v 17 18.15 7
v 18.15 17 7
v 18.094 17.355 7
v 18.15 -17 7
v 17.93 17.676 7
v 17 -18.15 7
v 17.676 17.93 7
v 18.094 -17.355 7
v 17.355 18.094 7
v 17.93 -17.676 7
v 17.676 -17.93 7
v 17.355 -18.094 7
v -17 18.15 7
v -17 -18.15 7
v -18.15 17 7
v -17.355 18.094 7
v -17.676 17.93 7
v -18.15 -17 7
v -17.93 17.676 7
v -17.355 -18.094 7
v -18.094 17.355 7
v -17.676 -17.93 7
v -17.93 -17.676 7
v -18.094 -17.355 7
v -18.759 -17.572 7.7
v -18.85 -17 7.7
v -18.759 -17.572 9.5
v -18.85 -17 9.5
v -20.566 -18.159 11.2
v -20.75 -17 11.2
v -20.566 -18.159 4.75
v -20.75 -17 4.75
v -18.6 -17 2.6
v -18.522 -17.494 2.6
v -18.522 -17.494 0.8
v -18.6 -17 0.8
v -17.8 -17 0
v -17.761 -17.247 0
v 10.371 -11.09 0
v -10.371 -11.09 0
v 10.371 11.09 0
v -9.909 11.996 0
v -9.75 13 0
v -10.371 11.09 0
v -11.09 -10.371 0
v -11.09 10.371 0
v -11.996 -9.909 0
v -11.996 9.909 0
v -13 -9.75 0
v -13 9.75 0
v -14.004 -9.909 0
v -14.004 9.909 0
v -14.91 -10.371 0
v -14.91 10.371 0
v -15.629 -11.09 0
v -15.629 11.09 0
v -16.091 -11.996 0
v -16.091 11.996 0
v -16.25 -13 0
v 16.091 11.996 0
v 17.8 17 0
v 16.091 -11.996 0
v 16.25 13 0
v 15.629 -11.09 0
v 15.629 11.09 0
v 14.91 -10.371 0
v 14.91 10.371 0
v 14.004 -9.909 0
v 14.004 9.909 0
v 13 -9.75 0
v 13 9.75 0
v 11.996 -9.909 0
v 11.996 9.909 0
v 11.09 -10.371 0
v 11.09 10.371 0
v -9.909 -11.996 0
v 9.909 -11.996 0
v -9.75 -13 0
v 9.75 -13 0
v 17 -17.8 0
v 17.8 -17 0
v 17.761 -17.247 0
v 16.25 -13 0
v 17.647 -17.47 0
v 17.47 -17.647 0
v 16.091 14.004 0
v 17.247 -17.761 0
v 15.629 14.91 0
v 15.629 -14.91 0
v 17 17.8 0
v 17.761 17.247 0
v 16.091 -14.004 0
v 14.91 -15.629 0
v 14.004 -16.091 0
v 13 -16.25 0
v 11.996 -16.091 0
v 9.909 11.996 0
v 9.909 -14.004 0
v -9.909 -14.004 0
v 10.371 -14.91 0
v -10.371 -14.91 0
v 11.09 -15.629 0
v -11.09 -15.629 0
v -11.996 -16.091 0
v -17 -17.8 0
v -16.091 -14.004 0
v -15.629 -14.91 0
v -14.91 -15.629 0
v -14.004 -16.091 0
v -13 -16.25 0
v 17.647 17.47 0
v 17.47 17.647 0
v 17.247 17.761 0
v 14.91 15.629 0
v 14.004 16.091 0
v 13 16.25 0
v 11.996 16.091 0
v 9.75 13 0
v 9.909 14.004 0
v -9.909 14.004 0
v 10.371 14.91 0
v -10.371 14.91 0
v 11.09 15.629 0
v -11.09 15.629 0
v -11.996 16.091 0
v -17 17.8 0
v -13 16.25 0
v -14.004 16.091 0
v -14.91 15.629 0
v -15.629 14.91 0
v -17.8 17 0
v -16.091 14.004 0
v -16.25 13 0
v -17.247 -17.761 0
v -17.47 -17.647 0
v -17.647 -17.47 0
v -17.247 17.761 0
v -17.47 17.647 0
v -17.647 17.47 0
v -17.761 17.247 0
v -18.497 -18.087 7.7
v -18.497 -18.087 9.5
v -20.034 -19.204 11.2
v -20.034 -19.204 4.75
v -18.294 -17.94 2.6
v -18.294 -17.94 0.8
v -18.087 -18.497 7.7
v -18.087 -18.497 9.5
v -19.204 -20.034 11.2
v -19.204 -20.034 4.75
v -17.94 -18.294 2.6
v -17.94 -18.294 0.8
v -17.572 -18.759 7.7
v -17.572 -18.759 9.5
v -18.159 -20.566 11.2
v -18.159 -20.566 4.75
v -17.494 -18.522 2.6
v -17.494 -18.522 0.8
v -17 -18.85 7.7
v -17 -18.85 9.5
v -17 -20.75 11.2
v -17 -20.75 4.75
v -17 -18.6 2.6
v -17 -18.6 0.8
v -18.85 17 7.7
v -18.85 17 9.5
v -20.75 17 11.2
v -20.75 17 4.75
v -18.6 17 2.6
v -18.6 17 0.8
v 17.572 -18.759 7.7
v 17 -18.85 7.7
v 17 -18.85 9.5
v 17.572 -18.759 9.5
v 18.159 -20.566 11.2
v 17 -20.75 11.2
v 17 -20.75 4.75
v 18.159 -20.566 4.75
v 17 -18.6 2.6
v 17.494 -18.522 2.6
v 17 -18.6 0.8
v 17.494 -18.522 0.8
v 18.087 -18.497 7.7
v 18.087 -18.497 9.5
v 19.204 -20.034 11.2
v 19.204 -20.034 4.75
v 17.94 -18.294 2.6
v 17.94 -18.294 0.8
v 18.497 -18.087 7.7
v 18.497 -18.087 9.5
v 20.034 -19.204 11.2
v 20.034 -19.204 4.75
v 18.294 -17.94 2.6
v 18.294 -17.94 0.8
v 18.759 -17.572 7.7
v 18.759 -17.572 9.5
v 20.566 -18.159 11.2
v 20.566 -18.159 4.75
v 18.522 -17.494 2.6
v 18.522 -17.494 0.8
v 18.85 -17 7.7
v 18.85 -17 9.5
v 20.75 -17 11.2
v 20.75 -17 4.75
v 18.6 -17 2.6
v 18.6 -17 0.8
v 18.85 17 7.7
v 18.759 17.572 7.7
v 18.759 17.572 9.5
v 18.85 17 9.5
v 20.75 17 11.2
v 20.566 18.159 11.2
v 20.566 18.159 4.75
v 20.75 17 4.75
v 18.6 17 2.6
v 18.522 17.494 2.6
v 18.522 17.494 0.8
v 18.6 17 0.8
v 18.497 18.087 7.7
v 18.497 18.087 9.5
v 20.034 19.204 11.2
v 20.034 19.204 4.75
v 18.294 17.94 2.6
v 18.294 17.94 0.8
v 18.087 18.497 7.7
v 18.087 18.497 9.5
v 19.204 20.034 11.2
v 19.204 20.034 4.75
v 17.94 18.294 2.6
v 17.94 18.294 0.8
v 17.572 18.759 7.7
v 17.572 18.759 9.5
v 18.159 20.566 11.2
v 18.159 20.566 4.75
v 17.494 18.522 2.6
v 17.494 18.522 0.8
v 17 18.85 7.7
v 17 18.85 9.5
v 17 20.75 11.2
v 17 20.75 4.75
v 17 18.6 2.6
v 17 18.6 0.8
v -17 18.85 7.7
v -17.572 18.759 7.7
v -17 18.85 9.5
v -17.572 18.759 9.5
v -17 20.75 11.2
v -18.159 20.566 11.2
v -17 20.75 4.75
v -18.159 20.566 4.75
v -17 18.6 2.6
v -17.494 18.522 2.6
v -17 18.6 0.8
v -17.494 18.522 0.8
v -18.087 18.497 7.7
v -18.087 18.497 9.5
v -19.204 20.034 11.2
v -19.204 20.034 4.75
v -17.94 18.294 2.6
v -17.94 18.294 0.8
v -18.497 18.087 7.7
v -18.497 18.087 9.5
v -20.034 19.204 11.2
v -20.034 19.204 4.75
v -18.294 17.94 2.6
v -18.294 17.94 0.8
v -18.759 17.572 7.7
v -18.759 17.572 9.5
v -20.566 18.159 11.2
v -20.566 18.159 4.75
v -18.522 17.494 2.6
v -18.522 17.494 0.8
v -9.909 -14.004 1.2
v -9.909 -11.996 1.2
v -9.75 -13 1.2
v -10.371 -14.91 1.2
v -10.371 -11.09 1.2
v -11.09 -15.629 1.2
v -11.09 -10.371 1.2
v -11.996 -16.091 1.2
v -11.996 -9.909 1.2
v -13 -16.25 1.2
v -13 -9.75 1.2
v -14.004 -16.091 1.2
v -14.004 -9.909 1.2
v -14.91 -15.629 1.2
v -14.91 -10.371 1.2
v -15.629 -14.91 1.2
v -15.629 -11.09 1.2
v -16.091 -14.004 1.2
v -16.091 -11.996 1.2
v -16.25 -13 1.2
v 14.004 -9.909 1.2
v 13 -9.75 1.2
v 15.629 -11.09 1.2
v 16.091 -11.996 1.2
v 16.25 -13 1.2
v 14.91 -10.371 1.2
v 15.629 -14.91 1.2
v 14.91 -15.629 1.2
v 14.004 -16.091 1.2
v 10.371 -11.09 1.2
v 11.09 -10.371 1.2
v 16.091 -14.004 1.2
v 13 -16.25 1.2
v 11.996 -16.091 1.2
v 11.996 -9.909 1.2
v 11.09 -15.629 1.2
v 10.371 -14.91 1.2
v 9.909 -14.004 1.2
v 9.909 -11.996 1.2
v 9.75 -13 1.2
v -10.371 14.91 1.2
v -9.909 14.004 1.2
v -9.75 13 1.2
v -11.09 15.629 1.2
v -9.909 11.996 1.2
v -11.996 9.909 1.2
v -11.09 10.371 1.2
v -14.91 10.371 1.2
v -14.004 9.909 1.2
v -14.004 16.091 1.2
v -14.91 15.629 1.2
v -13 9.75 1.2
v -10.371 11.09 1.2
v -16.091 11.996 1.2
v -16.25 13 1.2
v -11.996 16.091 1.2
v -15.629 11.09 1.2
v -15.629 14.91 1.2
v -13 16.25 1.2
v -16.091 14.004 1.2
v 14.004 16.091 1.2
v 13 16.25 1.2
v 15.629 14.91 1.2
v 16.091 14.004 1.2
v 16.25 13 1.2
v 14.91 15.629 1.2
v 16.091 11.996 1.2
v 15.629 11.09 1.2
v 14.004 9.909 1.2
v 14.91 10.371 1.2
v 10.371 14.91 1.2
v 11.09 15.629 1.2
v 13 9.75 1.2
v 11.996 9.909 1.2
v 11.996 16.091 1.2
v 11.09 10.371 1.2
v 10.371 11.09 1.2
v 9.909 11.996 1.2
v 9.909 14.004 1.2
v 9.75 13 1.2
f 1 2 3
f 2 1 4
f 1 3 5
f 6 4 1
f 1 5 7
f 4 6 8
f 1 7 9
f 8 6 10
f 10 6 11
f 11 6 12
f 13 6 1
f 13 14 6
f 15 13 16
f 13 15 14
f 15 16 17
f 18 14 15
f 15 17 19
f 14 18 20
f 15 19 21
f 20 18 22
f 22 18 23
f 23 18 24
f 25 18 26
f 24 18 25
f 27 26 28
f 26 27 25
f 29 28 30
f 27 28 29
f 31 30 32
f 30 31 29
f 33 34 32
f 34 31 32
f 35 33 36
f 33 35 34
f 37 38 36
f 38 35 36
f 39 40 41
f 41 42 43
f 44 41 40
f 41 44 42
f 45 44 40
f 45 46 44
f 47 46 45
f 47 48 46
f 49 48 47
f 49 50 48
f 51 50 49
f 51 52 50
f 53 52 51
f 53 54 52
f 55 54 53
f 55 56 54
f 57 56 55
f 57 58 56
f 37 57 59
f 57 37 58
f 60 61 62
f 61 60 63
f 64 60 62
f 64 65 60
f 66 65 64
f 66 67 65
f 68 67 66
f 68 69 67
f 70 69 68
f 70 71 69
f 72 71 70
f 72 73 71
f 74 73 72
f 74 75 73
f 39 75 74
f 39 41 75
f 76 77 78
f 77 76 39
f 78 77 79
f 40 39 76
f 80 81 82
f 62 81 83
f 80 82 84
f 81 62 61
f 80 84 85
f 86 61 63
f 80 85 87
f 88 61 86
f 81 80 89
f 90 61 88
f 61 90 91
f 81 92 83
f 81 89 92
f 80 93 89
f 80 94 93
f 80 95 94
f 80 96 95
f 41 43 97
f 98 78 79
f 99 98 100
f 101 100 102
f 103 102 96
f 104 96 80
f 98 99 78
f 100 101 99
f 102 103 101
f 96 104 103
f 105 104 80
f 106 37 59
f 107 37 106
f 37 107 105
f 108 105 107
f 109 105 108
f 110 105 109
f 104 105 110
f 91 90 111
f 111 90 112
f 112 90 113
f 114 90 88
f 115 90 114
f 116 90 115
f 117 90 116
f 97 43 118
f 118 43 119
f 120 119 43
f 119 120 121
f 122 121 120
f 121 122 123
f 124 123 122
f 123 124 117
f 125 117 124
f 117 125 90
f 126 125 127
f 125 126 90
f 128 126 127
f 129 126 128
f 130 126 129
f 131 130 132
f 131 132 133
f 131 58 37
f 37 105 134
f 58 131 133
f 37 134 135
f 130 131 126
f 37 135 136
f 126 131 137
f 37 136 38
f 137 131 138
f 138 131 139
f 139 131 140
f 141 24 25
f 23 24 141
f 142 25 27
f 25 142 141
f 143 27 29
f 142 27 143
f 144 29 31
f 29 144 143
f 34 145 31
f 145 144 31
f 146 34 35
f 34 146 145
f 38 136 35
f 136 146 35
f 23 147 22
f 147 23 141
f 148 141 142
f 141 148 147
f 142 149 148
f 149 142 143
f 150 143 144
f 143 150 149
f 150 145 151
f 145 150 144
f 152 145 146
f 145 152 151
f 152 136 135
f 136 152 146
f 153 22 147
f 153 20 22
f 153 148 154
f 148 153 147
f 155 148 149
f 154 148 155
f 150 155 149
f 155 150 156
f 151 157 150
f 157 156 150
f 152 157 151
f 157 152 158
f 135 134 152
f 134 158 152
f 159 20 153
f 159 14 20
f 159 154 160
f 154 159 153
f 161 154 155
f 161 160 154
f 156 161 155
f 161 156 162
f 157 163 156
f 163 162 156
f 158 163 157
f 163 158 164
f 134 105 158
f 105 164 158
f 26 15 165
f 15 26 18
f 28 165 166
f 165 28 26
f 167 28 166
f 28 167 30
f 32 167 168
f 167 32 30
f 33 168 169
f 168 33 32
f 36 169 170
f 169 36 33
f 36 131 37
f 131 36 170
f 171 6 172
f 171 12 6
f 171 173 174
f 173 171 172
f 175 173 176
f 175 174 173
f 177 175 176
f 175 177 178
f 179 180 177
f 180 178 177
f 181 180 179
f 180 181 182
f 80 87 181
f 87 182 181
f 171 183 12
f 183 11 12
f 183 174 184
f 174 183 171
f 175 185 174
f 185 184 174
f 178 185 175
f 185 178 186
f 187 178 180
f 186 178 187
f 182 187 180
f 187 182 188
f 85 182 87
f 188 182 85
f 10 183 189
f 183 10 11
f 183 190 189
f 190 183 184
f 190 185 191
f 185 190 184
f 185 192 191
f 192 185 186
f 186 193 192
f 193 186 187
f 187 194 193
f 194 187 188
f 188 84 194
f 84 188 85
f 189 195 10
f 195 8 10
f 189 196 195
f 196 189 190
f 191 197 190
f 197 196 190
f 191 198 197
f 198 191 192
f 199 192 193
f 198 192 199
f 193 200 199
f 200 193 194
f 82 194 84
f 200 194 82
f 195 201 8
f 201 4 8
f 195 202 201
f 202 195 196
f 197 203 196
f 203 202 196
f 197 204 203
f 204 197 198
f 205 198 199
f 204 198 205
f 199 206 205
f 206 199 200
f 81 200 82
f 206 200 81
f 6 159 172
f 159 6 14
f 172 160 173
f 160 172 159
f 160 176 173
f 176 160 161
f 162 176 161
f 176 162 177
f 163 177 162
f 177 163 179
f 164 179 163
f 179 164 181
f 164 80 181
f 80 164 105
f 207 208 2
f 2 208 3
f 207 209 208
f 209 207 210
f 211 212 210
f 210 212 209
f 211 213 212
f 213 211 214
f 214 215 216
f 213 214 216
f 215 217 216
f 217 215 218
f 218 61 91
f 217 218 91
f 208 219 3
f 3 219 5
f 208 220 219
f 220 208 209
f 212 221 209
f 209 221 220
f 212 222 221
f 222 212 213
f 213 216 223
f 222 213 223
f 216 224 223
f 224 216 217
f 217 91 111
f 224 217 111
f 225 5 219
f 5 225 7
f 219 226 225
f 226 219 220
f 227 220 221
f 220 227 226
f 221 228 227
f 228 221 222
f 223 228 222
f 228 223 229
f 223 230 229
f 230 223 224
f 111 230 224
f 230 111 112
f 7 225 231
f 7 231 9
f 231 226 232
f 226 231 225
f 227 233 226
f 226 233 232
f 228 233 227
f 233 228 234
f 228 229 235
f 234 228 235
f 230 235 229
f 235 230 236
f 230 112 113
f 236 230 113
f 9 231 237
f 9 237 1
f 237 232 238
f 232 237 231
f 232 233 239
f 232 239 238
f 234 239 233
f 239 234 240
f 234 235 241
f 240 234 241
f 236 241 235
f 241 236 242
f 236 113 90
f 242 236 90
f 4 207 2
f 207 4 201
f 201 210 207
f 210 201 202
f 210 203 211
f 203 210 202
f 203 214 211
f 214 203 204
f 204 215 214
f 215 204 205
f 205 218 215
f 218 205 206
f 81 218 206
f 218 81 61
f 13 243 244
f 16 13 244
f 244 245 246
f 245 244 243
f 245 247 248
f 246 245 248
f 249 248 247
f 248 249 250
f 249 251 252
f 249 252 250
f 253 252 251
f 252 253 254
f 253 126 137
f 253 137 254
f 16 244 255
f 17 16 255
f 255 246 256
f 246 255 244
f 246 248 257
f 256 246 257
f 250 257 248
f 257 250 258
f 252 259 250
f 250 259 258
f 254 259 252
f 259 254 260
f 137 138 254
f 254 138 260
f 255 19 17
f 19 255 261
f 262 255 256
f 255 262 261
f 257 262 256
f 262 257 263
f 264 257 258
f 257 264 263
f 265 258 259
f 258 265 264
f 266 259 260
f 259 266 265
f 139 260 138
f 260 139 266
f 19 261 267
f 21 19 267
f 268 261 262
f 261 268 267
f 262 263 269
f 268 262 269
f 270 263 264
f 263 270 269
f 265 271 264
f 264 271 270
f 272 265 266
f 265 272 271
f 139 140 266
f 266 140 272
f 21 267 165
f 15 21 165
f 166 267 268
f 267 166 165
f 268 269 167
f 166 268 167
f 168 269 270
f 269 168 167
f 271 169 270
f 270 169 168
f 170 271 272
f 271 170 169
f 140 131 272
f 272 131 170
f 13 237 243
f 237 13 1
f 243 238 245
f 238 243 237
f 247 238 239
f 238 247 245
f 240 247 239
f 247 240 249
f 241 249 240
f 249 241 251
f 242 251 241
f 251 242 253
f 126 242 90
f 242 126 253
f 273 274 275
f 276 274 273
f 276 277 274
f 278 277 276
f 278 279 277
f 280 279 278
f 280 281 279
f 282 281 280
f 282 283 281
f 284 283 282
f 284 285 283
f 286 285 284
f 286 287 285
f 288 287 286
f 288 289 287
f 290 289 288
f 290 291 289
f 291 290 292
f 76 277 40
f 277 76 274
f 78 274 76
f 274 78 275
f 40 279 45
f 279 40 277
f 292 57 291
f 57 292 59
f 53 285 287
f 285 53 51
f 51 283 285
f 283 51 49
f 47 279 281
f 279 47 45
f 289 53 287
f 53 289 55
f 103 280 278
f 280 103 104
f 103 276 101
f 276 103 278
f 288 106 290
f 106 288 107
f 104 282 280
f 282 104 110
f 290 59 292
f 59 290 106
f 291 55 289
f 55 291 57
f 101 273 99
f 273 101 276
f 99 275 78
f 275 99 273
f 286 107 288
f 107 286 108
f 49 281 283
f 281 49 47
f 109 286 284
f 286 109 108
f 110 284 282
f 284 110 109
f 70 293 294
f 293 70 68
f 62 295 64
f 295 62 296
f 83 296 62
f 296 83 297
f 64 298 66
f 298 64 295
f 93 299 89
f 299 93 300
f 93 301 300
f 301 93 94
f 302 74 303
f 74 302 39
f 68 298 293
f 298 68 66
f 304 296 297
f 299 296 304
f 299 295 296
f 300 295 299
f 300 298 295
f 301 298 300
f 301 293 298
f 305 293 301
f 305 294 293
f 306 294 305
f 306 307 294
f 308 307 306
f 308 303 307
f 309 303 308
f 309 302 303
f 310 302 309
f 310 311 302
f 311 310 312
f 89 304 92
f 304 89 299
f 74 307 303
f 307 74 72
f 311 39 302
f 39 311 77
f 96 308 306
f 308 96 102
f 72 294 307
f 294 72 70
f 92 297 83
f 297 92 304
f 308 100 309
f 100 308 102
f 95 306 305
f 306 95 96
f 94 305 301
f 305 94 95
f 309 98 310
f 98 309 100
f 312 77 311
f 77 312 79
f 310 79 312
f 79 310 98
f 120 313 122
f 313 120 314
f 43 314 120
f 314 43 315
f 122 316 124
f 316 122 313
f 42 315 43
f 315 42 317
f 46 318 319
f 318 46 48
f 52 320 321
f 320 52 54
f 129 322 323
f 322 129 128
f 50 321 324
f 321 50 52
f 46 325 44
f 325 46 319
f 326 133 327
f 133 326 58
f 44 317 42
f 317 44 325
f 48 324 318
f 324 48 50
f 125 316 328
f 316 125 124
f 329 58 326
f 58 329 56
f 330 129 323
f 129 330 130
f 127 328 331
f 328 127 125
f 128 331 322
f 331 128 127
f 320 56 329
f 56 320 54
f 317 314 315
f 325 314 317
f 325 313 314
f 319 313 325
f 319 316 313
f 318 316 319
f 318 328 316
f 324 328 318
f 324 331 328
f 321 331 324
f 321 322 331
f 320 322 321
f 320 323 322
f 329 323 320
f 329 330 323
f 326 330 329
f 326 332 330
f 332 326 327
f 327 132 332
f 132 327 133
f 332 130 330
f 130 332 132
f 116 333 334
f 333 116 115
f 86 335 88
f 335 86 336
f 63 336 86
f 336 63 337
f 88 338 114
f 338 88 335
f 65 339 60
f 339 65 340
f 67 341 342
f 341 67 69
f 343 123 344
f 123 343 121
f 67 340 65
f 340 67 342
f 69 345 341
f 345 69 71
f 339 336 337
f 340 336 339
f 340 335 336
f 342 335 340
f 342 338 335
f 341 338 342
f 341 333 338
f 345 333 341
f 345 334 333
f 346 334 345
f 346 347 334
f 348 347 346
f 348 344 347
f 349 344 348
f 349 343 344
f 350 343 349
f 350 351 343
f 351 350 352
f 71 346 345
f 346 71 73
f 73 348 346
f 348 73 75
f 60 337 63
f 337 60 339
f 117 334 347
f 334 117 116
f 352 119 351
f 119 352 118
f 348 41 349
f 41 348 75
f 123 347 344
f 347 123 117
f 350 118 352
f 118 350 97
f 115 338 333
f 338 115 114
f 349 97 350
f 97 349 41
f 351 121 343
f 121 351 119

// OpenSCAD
// file: GridfinityLib.scad
/* Edge profile point arrays!
 *
 * Should be listed from bottom to top.
 * - X=0 is at the edge of the cell (*not the slightly narrower block*)
 * - Positive X is the offset into the left side
 * - Y=0 is the floor.
 * - Corner profile point lists start with the base
 *   and go upwards to the side.
 */

// Regular block bottom
tog_gridfinity_block_bottom_corner_profile_points = [
	[3.20, 0.00], // Right end of bottom bevel
	[2.40, 0.80],
	[2.40, 2.60],
	[0.25, 4.75], // Top of left bevel
];

// Block lip, with min(X) = 0.25
tog_gridfinity_block_lip_corner_profile_points = [
	[2.85, 0.00], // Right end of bottom bevel
	[2.15, 0.70],
	[2.15, 2.50],
	[0.25, 4.20], // Top tip
];

// Full-cell lip.   Starts at cell edge instead of 0.25 inward for blocks.
// Alternatively one could always use this and just intersect with the block hull,
// (or subtracting the inverse)
// which may be simpler especially if making blocks with a grid on top.
tog_gridfinity_full_lip_corner_profile_points = [
	[2.85, 0.00], // Right end of bottom bevel
	[2.15, 0.70],
	[2.15, 2.50],
	[0.00, 4.65], // Top tip
];

function tog_gridfinity_make_corner_extrudable_points(corner_profile_points, margin, block_height=7, corner_radius=4) = [
	[0, 0],
	for( point=corner_profile_points ) [point[0] - corner_radius, point[1]],
	[margin - corner_radius, block_height],
	[0, block_height],
];

function tog_gridfinity_reverse_list(list) = [
	for( i=[len(list)-1: -1 : 0] ) list[i]
];

/**
 * Reverses the list of points for use as a cutout at the top of a block
 * and also adds some amount of Y
 */
//function tog_gridfinity_adjusted_lip_points(point_list, delta_y=0) = [
//	for( i=[len(list)-1: -1 : 0] ) list[i]
//];

// Extrudable points for an entire block, with lip, filled to the specified height
function tog_gridfinity_make_block_with_lip_extrudable_points( block_height, floor_height=7, corner_radius=4, wall_thickness=2 ) = [
	[0, 0],
	for( point=tog_gridfinity_block_bottom_corner_profile_points ) [point[0] - corner_radius, point[1]],
	for( point=tog_gridfinity_reverse_list(tog_gridfinity_block_lip_corner_profile_points) ) [point[0] - corner_radius, point[1] + block_height],
	each (floor_height == block_height ? [] : [
		// TODO: Really want to filter this list of down-the-inside-of-the-lip points
		// based on being >= floor height.
		[tog_gridfinity_block_lip_corner_profile_points[0][0] - corner_radius, max(floor_height, block_height-2)], // 2 is probably fine; really want a max. 45deg from wall thickness to innermost point in lip
		[wall_thickness+0.25 - corner_radius, max(floor_height, block_height-4)], // difference y=-2 is probably fine; really want a max. 45deg from wall thickness to innermost point in lip
		[wall_thickness+0.25 - corner_radius, floor_height],
	]),
	[0, floor_height],,
	//[tog_gridfinity_block_lip_corner_profile_points[0][0] - corner_radius, floor_height],
];

// Create full extrudable polygon where x=0 refers to the pivot point
function tog_gridfinity_make_block_bottom_corner_extrudable_points(block_height=7, corner_radius=4) = tog_gridfinity_make_corner_extrudable_points(
	tog_gridfinity_block_bottom_corner_profile_points,
	0.25,
	block_height=block_height,
	corner_radius=corner_radius
);

module tog_gridfinity_block_from_profile_points(profile_points, block_width=42, corner_radius=4, overlap=0) {
	bottom_z = profile_points[0][1];
	top_z    = profile_points[len(profile_points)-1][1];
	for( r=[0:90:270] ) rotate([0,0,r]) {
		translate([-block_width/2+corner_radius, -block_width/2+corner_radius, 0]) {
			rotate_extrude(angle=90) {
				polygon(profile_points);
			}
		}
		translate([-block_width/2+corner_radius, 0, 0]) {
			rotate([90,0,0]) linear_extrude(block_width-2*corner_radius+overlap*2, center=true) {
				polygon(profile_points);
			}
		}
	}
	translate([0,0,(bottom_z+top_z)/2]) cube([block_width-corner_radius*2+overlap*2, block_width-corner_radius*2+overlap*2, top_z-bottom_z], center=true);
}


/**
 * Hull to be intersected with block bottoms for gridfinity compatibility.
 * Overlap=0 seems to work, but it can be set to a small value, like 1/64,
 * if OpenSCAD gets confused about exactly interfacing surfaces.
 */
module tog_gridfinity_block_bottom(height=14, gridfinity_pitch=42, corner_radius=4, overlap=0) {
	tog_gridfinity_block_from_profile_points(tog_gridfinity_make_block_bottom_corner_extrudable_points(height, corner_radius), gridfinity_pitch, corner_radius, overlap);
}

module tog_gridfinity_block_with_lip(
	height=14, floor_height=7,
	gridfinity_pitch=42, corner_radius=4, overlap=0,
	magnet_hole_diameter=6.5,
	magnet_hole_depth=2.4,
) {
	difference() {
		tog_gridfinity_block_from_profile_points(tog_gridfinity_make_block_with_lip_extrudable_points(height, floor_height, corner_radius), gridfinity_pitch, corner_radius, overlap);
		if( magnet_hole_diameter > 0 && magnet_hole_depth > 0 ) for( ym=[-1,1] ) for( xm=[-1,1] ) {
			translate([13*xm, 13*ym, 0]) cylinder(d=magnet_hole_diameter, h=magnet_hole_depth, center=true);
		}
	}
}
// main file
$fn = 20;
block_height = 7;
floor_height = 7;

include <GridfinityLib.scad>

tog_gridfinity_block_with_lip(block_height, floor_height, 42, 4);
